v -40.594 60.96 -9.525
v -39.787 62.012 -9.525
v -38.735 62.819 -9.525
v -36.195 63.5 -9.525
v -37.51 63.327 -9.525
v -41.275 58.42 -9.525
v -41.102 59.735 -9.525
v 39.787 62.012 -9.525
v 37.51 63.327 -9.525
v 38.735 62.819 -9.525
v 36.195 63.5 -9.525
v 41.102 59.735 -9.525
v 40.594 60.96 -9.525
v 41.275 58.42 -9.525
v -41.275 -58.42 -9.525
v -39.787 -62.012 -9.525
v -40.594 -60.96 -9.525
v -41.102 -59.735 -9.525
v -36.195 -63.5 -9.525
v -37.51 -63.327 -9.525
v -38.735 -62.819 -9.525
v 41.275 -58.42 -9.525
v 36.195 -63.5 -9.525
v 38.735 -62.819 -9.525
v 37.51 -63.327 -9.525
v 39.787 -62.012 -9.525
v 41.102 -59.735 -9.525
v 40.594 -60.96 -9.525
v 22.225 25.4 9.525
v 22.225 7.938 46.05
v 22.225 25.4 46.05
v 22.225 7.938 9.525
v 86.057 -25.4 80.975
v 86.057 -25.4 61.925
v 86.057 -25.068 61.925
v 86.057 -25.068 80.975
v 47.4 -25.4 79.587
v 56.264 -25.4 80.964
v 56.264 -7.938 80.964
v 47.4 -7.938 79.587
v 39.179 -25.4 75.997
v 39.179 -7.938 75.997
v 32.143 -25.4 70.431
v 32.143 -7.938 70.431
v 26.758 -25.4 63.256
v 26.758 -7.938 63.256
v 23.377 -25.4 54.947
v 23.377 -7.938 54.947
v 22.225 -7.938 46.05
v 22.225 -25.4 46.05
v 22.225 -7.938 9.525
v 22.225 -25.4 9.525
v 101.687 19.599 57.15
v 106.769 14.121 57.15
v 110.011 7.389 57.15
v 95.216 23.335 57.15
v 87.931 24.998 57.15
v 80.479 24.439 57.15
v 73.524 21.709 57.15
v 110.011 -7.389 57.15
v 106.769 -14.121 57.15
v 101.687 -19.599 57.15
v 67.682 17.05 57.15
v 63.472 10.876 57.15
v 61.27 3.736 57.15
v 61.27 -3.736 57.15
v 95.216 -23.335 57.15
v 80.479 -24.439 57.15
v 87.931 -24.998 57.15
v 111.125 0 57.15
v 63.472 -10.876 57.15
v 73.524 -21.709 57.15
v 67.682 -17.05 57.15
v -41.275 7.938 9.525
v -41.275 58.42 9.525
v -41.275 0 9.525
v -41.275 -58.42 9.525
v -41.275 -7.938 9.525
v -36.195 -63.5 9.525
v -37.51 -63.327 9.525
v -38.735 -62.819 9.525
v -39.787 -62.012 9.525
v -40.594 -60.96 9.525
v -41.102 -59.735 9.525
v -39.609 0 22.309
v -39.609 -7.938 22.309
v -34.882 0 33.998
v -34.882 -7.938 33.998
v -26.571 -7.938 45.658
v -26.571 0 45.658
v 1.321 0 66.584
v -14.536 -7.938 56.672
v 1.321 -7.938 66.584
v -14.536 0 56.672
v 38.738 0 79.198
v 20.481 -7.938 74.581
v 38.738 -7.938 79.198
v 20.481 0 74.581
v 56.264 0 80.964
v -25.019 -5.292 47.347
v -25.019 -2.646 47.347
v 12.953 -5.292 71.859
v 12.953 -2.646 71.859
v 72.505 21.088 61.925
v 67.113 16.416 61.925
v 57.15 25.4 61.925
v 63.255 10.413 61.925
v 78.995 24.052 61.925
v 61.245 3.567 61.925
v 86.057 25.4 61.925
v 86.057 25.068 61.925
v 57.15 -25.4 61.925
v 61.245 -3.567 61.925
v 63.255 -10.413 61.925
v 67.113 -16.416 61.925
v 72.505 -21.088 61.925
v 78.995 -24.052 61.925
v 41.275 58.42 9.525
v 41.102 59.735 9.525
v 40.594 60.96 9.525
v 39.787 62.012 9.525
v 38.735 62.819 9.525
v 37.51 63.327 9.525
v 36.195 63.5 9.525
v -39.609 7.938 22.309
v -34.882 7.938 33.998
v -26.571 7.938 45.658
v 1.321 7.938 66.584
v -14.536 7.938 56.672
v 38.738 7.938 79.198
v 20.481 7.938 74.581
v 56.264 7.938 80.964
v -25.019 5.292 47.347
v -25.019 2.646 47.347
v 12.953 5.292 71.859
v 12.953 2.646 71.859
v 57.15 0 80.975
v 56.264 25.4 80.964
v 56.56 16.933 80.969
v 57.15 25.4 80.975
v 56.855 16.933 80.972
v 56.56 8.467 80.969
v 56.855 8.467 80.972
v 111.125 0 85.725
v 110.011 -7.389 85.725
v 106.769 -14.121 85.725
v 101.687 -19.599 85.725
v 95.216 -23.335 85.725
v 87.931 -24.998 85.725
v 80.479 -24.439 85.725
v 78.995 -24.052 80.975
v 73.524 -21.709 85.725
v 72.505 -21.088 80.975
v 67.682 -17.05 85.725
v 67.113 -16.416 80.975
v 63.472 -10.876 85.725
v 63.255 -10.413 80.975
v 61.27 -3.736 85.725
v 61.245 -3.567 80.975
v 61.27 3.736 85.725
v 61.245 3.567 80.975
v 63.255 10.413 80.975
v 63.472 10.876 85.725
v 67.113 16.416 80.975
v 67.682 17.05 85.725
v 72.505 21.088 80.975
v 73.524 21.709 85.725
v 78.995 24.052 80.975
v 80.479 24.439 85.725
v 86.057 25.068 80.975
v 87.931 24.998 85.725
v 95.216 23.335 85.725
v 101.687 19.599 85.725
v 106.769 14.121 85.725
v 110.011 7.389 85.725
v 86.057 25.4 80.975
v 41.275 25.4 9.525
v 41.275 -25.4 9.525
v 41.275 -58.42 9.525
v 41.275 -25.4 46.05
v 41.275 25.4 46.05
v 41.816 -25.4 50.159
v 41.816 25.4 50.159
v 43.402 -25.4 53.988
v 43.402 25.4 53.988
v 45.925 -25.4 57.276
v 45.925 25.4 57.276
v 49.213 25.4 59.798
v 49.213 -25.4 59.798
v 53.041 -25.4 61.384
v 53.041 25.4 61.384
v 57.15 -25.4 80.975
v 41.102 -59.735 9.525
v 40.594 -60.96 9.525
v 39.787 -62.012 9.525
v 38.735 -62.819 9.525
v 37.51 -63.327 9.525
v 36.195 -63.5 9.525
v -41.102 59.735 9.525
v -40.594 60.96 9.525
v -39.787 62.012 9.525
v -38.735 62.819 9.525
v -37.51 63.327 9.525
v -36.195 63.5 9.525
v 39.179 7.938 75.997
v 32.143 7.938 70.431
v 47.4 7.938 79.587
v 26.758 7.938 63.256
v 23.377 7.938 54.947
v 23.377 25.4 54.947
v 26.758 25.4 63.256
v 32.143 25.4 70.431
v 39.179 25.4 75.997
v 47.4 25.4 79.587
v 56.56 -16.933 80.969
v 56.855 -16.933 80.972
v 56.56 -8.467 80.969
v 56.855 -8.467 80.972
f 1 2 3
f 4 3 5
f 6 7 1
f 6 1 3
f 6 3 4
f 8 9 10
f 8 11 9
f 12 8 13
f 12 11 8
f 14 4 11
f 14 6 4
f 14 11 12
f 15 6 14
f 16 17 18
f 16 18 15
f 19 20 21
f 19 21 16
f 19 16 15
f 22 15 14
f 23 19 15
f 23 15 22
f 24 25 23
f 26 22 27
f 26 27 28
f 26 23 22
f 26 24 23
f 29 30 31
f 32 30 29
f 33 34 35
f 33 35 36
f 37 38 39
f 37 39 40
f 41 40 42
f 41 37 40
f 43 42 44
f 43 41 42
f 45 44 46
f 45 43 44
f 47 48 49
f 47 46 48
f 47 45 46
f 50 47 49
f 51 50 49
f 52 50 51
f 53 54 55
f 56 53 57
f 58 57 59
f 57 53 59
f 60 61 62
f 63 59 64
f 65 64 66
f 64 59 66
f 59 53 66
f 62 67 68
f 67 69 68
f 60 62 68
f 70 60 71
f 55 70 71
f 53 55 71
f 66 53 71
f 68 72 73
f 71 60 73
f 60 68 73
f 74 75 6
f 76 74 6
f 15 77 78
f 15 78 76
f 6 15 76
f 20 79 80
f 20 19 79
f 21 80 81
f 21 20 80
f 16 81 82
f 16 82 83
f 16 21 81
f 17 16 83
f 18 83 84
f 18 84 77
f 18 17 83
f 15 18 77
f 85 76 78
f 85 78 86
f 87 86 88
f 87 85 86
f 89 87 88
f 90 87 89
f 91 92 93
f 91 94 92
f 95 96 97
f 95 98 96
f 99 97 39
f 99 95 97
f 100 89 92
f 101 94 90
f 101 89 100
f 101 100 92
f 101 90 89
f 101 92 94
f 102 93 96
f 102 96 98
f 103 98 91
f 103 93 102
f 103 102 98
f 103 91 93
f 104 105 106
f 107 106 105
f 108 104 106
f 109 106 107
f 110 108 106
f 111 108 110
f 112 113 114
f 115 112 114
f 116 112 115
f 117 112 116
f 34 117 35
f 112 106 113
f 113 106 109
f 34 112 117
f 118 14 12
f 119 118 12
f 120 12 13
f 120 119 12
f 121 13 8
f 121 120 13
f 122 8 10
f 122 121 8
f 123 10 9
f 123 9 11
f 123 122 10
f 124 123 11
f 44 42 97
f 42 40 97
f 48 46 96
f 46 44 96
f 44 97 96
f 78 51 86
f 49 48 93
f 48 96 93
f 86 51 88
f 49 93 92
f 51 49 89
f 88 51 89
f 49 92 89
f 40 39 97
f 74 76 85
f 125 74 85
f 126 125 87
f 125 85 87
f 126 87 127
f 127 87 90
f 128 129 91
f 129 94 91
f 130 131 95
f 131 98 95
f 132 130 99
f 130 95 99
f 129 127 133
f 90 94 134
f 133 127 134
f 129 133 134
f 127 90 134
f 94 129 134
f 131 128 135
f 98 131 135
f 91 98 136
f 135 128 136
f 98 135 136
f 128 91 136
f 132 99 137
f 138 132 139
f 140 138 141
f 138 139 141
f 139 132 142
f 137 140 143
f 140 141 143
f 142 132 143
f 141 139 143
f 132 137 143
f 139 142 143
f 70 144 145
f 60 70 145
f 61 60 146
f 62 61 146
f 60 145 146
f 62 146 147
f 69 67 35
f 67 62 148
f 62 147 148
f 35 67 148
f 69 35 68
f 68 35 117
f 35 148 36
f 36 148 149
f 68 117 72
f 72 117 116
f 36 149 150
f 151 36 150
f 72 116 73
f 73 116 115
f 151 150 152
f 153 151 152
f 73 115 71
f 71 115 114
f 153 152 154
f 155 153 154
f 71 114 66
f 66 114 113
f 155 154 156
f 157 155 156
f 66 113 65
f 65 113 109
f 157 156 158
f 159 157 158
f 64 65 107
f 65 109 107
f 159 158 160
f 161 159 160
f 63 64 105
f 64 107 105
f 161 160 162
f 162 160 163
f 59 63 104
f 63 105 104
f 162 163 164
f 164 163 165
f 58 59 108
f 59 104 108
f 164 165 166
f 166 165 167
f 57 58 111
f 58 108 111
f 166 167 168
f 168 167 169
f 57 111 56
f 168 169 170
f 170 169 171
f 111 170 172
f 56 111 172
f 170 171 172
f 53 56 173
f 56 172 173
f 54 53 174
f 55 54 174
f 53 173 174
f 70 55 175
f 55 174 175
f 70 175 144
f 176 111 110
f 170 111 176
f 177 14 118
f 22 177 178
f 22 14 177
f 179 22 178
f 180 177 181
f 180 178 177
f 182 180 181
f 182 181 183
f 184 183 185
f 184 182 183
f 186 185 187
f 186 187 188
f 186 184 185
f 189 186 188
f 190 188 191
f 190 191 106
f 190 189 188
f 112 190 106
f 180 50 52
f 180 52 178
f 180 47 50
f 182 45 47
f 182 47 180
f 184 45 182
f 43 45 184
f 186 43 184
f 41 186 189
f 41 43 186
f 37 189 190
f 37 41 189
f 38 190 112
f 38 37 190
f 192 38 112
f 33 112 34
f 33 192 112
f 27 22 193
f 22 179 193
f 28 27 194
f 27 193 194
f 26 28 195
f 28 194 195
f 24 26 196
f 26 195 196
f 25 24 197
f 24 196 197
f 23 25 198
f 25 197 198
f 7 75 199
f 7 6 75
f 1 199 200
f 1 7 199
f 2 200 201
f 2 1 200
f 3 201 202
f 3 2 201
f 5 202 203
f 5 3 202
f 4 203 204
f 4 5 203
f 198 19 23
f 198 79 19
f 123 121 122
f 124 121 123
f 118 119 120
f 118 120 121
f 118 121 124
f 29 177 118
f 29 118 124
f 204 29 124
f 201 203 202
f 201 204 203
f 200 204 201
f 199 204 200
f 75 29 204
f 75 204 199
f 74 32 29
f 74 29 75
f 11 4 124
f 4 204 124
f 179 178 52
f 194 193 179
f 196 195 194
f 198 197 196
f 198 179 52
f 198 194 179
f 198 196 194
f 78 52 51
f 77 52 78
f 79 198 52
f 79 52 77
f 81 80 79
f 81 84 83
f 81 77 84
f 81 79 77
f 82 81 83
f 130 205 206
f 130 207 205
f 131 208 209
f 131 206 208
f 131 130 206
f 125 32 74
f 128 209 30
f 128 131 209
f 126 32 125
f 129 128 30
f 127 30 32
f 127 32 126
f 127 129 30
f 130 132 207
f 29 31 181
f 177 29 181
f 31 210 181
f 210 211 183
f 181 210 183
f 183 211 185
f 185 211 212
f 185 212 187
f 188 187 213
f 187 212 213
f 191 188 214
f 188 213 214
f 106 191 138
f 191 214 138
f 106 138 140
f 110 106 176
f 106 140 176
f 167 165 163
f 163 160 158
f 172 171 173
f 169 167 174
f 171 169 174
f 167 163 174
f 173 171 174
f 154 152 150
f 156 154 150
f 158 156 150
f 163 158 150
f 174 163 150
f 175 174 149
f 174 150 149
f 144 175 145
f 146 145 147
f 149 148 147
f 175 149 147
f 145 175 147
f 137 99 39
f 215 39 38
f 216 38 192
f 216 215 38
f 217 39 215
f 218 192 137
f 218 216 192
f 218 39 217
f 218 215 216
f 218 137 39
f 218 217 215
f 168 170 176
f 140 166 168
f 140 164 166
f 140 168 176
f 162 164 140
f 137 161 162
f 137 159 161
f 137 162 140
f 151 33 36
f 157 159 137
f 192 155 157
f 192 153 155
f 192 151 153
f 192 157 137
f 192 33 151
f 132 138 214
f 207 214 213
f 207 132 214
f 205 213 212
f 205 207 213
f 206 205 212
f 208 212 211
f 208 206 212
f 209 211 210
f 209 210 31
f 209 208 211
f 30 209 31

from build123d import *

# Parameters (mm, degrees)
F1_DEPTH = 63.5
F0_W     = 25.7323723912
F0_H     = 19.05
F2_DEPTH = 25.4
F3_DEPTH = 25.4
F4_DEPTH = 7.9375
F6_R     = 5.08


with BuildPart() as f1:
    # F0 (on Front) → F1 (new body, symmetric)
    with BuildSketch(Plane.XZ):
        Polygon((22.225, 9.525), (-41.275, 9.525), (-41.275, -9.525), (41.275, -9.525), (41.275, 9.525), align=None)
    extrude(amount=F1_DEPTH, both=True)

    # F0 (on Front) → F2 (join, symmetric)
    with BuildSketch(Plane.XZ):
        with BuildLine():
            Line((22.225, 46.0502), (22.225, 9.525))
            Line((22.225, 9.525), (41.275, 9.525))
            Line((41.275, 9.525), (41.275, 46.0502))
            ThreePointArc((41.275, 46.0502), (45.9246798487, 57.2755201513), (57.15, 61.9252))
            Line((57.15, 61.9252), (60.325, 61.9252))
            Line((60.325, 61.9252), (60.325, 80.9752))
            Line((60.325, 80.9752), (57.15, 80.9752))
            add(Edge.make_bspline(
                [(56.2643970704, 80.9639699547), (56.5604917652, 80.9691161727), (56.8557023266, 80.972860747), (57.15, 80.9752)],
                knots=[120.7425968685, 120.7425968685, 120.7425968685, 120.7425968685, 121.6248811101, 121.6248811101, 121.6248811101, 121.6248811101], degree=3))
            ThreePointArc((56.2643970704, 80.9639699547), (32.1431478659, 70.4307859516), (22.225, 46.0502))
        make_face()
        with Locations((73.1911861956, 71.4502)):
            Rectangle(F0_W, F0_H)
    extrude(amount=F2_DEPTH, both=True)

    # F0 (on Front) → F3 (join, symmetric)
    with BuildSketch(Plane.XZ):
        with BuildLine():
            Line((22.225, 46.0502), (22.225, 9.525))
            Line((22.225, 9.525), (41.275, 9.525))
            Line((41.275, 9.525), (41.275, 46.0502))
            ThreePointArc((41.275, 46.0502), (45.9246798487, 57.2755201513), (57.15, 61.9252))
            Line((57.15, 61.9252), (60.325, 61.9252))
            Line((60.325, 61.9252), (60.325, 80.9752))
            Line((60.325, 80.9752), (57.15, 80.9752))
            add(Edge.make_bspline(
                [(56.2643970704, 80.9639699547), (56.5604917652, 80.9691161727), (56.8557023266, 80.972860747), (57.15, 80.9752)],
                knots=[120.7425968685, 120.7425968685, 120.7425968685, 120.7425968685, 121.6248811101, 121.6248811101, 121.6248811101, 121.6248811101], degree=3))
            ThreePointArc((56.2643970704, 80.9639699547), (32.1431478659, 70.4307859516), (22.225, 46.0502))
        make_face()
        with Locations((73.1911861956, 71.4502)):
            Rectangle(F0_W, F0_H)
    extrude(amount=F3_DEPTH, both=True)

    # F0 (on Front) → F4 (join, symmetric)
    with BuildSketch(Plane.XZ):
        with BuildLine():
            add(Edge.make_bspline(
                [(-41.275, 9.525), (-41.3365892796, 53.3046842853), (15.7431674311, 80.2596983695), (56.2643970704, 80.9639699547)],
                knots=[0, 0, 0, 0, 120.7425968685, 120.7425968685, 120.7425968685, 120.7425968685], degree=3))
            Line((-41.275, 9.525), (22.225, 9.525))
            Line((22.225, 9.525), (22.225, 46.0502))
            ThreePointArc((22.225, 46.0502), (32.1431478659, 70.4307859516), (56.2643970704, 80.9639699547))
        make_face()
    extrude(amount=F4_DEPTH, both=True)

    # F0 (on Front) → F5 (revolve)
    with BuildSketch(Plane.XZ):
        Polygon((86.0573723912, 85.725), (86.0573723912, 80.9752), (86.0573723912, 61.9252), (86.0573723912, 57.15), (111.125, 57.15), (111.125, 85.725), align=None)
    revolve(axis=Axis((86.0573723912, 0, 71.4375), (0, 0, -1)))

    # F6
    f6_edges = [f1.edges().sort_by_distance(p)[0] for p in [
        (-41.275, 63.5, 0),
        (-41.275, -63.5, 0),
        (41.275, 63.5, 0),
        (41.275, -63.5, 0),
    ]]
    fillet(f6_edges, radius=F6_R)


solid = f1.part
